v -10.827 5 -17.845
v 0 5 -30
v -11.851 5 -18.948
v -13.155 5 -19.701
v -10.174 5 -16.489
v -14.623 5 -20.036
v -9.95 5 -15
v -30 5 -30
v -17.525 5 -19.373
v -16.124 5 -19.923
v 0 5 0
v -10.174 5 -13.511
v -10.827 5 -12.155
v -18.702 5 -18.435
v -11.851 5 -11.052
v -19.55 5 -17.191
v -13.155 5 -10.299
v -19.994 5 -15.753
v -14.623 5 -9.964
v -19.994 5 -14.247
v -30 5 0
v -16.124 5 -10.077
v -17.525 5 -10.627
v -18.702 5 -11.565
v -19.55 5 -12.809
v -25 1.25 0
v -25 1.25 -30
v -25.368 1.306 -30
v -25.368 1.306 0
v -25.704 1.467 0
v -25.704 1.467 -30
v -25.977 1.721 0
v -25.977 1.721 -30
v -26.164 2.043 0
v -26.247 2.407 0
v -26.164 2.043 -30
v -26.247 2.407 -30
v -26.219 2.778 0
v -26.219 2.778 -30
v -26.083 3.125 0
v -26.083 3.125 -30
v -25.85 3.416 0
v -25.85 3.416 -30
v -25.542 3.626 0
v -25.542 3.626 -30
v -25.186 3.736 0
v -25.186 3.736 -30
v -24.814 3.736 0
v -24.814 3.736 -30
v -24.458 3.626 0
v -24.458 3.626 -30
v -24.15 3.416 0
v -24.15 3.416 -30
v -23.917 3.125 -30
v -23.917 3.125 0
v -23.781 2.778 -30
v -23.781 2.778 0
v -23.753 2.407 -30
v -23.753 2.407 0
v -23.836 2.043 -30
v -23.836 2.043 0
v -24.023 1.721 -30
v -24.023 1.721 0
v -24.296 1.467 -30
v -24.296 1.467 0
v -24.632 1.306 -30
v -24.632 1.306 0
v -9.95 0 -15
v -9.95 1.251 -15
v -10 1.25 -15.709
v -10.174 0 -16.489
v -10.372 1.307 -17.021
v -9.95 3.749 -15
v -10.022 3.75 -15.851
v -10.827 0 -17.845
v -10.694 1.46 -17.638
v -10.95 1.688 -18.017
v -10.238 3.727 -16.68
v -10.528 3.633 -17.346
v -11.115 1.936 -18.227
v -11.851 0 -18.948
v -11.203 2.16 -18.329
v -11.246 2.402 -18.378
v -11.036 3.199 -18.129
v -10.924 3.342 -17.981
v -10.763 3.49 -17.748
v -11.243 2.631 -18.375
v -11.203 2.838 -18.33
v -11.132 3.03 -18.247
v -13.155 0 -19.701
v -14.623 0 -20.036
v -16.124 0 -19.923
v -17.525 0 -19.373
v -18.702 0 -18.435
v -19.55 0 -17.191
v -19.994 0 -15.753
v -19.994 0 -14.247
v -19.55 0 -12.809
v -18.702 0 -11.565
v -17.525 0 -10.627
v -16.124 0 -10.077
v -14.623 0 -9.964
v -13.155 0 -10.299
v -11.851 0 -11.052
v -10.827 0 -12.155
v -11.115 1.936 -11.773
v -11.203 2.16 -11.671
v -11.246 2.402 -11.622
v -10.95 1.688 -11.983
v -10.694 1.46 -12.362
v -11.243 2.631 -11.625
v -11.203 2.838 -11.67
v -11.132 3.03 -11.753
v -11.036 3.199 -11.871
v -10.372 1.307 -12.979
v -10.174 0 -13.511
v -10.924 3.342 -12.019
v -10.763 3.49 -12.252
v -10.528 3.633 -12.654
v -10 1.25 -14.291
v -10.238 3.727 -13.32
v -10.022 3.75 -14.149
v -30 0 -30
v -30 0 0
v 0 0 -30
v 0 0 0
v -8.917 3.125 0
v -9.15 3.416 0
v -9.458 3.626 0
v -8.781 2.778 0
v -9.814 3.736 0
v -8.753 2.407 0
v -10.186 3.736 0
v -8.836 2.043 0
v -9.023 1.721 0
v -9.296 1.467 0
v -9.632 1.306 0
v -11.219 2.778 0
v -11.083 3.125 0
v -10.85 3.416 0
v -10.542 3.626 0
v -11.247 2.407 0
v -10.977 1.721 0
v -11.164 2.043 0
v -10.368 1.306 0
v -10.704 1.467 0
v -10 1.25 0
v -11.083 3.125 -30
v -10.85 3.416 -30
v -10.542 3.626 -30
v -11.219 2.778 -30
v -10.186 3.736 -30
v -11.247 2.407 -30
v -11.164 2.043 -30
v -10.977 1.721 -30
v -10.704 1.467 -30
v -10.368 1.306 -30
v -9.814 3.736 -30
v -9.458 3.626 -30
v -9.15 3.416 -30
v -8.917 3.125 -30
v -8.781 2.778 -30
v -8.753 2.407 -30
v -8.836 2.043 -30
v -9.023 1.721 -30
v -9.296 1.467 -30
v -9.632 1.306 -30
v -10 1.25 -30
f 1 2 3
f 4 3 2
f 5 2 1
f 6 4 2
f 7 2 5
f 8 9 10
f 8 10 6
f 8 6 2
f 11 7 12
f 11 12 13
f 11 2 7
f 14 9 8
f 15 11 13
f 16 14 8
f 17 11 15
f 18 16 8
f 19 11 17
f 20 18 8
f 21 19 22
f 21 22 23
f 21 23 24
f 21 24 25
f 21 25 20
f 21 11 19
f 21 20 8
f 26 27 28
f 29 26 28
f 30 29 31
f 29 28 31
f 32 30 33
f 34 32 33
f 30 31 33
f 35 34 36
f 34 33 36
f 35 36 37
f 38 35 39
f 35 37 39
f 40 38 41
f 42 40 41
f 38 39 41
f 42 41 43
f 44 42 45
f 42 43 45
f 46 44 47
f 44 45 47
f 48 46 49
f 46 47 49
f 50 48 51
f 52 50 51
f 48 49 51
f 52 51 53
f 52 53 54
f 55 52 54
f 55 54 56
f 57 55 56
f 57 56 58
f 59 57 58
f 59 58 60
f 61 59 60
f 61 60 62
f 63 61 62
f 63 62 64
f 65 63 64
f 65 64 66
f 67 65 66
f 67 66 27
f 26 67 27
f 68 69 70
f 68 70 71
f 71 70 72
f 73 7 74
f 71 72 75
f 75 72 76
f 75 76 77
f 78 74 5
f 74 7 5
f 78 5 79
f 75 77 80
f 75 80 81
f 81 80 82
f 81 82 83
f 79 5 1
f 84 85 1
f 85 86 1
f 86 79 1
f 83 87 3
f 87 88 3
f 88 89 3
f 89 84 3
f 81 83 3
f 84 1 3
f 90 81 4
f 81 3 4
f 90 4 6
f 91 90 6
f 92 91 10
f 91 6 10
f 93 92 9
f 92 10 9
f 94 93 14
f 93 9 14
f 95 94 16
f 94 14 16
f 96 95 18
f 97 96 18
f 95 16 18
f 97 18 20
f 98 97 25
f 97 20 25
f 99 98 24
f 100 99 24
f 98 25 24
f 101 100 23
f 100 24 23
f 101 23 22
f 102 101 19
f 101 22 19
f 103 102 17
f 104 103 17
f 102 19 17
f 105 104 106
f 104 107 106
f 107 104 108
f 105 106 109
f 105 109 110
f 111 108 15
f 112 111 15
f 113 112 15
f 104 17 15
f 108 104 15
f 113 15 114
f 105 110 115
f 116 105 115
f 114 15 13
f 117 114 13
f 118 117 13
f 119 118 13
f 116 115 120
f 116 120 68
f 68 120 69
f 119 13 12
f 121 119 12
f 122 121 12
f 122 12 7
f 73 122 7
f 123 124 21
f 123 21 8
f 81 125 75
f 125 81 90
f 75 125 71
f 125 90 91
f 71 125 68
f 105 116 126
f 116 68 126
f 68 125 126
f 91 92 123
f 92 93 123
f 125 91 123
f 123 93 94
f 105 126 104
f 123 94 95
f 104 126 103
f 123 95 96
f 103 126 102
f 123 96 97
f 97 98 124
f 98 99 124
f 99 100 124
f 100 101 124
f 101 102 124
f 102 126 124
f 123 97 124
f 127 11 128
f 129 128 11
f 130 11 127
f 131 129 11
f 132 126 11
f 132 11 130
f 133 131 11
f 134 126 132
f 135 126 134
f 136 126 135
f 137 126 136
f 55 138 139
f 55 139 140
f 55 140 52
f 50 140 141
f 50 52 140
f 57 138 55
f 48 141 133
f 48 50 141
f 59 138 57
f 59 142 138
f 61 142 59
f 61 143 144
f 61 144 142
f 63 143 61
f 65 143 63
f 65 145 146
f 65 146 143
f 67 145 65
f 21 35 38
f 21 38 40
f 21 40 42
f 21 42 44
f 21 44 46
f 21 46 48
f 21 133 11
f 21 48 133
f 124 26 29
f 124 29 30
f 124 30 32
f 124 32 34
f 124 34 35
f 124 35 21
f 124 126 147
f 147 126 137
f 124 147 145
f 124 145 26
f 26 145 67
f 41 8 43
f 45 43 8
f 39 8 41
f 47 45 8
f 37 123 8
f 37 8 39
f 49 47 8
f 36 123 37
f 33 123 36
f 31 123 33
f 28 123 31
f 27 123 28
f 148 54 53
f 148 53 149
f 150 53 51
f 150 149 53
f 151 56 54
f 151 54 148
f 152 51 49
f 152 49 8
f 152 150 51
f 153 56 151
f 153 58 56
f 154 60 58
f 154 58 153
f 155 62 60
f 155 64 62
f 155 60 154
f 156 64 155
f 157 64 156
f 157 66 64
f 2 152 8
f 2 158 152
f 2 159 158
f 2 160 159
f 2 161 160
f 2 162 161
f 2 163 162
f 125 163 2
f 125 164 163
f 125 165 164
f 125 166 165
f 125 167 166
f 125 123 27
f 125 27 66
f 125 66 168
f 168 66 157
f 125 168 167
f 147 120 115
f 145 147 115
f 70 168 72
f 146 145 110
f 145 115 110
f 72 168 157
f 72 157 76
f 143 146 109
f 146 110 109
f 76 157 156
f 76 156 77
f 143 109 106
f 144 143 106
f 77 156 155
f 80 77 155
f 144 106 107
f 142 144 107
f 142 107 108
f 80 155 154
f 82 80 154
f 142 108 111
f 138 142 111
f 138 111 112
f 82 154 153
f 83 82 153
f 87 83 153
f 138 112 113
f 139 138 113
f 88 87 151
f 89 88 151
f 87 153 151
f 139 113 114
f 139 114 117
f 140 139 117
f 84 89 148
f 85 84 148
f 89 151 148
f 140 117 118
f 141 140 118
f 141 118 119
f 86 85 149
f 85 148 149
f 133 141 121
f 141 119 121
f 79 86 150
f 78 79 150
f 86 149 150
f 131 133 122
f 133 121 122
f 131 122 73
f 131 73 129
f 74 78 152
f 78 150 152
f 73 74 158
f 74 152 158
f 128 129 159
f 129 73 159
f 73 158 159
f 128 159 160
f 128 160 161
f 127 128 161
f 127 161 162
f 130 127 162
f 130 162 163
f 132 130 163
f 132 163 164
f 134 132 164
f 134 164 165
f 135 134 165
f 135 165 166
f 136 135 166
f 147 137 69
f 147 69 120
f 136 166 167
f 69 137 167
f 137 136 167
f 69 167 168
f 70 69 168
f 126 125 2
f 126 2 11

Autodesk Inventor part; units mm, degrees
ref_plane "YZ Plane" through (0, 0, 0) normal (1, 0, 0) x (0, 1, 0)
ref_plane "XZ Plane" through (0, 0, 0) normal (0, 1, 0) x (-1, 0, 0)
ref_plane "XY Plane" through (0, 0, 0) normal (0, 0, 1) x (1, 0, 0)
sketch "スケッチ1" plane through (0, 0, 0) normal (0, 1, 0) x (-1, 0, 0)
  line L0 (0, 0) -> (30, 0)
  line L1 (30, 0) -> (30, -30)
  line L2 (30, -30) -> (0, -30)
  line L3 (0, -30) -> (0, 0)
  dimension "d0" = 30
  dimension "d1" = 30
extrude "押し出し1" add sketch "スケッチ1" along normal blind 5
sketch "スケッチ2" plane through (-30, 0, 0) normal (0, 0, 1) x (1, 0, 0)
  line L0 (0, 0) -> (0, 5) projected
  line L1 (0, 2.5) -> (30, 2.5)
  line L2 (30, 0) -> (30, 5) projected
  point P0 (5, 2.5)
  point P1 (20, 2.5)
  dimension "d4" = 10
  dimension "d5" = 15
hole "穴1" at (-25, 2.5, 0) at (-10, 2.5, 0) direction (0, 0, -1) diameter 2.5 end through all
sketch "スケッチ3" plane through (0, 5, 0) normal (0, 1, 0) x (1, 0, 0)
  line L0 (-30, 30) -> (-30, 0) projected
  line L1 (-30, 15) -> (0, 15)
  line L2 (0, 0) -> (0, 30) projected
  line L3 (-30, 0) -> (0, 0) projected
  line L4 (-15, 0) -> (-15, 30)
  line L5 (0, 30) -> (-30, 30) projected
  circle A0 centre (-15, 15) radius 5.05
  dimension "d13" = 10.1
extrude "押し出し2" cut sketch "スケッチ3" against normal blind 5 contours A0 L4 L1 | L1 L4 A0 | A0 L1 L4 | L1 A0 L4
properties part number "hand2_08" material "アルミニウム 6061-AHC"
